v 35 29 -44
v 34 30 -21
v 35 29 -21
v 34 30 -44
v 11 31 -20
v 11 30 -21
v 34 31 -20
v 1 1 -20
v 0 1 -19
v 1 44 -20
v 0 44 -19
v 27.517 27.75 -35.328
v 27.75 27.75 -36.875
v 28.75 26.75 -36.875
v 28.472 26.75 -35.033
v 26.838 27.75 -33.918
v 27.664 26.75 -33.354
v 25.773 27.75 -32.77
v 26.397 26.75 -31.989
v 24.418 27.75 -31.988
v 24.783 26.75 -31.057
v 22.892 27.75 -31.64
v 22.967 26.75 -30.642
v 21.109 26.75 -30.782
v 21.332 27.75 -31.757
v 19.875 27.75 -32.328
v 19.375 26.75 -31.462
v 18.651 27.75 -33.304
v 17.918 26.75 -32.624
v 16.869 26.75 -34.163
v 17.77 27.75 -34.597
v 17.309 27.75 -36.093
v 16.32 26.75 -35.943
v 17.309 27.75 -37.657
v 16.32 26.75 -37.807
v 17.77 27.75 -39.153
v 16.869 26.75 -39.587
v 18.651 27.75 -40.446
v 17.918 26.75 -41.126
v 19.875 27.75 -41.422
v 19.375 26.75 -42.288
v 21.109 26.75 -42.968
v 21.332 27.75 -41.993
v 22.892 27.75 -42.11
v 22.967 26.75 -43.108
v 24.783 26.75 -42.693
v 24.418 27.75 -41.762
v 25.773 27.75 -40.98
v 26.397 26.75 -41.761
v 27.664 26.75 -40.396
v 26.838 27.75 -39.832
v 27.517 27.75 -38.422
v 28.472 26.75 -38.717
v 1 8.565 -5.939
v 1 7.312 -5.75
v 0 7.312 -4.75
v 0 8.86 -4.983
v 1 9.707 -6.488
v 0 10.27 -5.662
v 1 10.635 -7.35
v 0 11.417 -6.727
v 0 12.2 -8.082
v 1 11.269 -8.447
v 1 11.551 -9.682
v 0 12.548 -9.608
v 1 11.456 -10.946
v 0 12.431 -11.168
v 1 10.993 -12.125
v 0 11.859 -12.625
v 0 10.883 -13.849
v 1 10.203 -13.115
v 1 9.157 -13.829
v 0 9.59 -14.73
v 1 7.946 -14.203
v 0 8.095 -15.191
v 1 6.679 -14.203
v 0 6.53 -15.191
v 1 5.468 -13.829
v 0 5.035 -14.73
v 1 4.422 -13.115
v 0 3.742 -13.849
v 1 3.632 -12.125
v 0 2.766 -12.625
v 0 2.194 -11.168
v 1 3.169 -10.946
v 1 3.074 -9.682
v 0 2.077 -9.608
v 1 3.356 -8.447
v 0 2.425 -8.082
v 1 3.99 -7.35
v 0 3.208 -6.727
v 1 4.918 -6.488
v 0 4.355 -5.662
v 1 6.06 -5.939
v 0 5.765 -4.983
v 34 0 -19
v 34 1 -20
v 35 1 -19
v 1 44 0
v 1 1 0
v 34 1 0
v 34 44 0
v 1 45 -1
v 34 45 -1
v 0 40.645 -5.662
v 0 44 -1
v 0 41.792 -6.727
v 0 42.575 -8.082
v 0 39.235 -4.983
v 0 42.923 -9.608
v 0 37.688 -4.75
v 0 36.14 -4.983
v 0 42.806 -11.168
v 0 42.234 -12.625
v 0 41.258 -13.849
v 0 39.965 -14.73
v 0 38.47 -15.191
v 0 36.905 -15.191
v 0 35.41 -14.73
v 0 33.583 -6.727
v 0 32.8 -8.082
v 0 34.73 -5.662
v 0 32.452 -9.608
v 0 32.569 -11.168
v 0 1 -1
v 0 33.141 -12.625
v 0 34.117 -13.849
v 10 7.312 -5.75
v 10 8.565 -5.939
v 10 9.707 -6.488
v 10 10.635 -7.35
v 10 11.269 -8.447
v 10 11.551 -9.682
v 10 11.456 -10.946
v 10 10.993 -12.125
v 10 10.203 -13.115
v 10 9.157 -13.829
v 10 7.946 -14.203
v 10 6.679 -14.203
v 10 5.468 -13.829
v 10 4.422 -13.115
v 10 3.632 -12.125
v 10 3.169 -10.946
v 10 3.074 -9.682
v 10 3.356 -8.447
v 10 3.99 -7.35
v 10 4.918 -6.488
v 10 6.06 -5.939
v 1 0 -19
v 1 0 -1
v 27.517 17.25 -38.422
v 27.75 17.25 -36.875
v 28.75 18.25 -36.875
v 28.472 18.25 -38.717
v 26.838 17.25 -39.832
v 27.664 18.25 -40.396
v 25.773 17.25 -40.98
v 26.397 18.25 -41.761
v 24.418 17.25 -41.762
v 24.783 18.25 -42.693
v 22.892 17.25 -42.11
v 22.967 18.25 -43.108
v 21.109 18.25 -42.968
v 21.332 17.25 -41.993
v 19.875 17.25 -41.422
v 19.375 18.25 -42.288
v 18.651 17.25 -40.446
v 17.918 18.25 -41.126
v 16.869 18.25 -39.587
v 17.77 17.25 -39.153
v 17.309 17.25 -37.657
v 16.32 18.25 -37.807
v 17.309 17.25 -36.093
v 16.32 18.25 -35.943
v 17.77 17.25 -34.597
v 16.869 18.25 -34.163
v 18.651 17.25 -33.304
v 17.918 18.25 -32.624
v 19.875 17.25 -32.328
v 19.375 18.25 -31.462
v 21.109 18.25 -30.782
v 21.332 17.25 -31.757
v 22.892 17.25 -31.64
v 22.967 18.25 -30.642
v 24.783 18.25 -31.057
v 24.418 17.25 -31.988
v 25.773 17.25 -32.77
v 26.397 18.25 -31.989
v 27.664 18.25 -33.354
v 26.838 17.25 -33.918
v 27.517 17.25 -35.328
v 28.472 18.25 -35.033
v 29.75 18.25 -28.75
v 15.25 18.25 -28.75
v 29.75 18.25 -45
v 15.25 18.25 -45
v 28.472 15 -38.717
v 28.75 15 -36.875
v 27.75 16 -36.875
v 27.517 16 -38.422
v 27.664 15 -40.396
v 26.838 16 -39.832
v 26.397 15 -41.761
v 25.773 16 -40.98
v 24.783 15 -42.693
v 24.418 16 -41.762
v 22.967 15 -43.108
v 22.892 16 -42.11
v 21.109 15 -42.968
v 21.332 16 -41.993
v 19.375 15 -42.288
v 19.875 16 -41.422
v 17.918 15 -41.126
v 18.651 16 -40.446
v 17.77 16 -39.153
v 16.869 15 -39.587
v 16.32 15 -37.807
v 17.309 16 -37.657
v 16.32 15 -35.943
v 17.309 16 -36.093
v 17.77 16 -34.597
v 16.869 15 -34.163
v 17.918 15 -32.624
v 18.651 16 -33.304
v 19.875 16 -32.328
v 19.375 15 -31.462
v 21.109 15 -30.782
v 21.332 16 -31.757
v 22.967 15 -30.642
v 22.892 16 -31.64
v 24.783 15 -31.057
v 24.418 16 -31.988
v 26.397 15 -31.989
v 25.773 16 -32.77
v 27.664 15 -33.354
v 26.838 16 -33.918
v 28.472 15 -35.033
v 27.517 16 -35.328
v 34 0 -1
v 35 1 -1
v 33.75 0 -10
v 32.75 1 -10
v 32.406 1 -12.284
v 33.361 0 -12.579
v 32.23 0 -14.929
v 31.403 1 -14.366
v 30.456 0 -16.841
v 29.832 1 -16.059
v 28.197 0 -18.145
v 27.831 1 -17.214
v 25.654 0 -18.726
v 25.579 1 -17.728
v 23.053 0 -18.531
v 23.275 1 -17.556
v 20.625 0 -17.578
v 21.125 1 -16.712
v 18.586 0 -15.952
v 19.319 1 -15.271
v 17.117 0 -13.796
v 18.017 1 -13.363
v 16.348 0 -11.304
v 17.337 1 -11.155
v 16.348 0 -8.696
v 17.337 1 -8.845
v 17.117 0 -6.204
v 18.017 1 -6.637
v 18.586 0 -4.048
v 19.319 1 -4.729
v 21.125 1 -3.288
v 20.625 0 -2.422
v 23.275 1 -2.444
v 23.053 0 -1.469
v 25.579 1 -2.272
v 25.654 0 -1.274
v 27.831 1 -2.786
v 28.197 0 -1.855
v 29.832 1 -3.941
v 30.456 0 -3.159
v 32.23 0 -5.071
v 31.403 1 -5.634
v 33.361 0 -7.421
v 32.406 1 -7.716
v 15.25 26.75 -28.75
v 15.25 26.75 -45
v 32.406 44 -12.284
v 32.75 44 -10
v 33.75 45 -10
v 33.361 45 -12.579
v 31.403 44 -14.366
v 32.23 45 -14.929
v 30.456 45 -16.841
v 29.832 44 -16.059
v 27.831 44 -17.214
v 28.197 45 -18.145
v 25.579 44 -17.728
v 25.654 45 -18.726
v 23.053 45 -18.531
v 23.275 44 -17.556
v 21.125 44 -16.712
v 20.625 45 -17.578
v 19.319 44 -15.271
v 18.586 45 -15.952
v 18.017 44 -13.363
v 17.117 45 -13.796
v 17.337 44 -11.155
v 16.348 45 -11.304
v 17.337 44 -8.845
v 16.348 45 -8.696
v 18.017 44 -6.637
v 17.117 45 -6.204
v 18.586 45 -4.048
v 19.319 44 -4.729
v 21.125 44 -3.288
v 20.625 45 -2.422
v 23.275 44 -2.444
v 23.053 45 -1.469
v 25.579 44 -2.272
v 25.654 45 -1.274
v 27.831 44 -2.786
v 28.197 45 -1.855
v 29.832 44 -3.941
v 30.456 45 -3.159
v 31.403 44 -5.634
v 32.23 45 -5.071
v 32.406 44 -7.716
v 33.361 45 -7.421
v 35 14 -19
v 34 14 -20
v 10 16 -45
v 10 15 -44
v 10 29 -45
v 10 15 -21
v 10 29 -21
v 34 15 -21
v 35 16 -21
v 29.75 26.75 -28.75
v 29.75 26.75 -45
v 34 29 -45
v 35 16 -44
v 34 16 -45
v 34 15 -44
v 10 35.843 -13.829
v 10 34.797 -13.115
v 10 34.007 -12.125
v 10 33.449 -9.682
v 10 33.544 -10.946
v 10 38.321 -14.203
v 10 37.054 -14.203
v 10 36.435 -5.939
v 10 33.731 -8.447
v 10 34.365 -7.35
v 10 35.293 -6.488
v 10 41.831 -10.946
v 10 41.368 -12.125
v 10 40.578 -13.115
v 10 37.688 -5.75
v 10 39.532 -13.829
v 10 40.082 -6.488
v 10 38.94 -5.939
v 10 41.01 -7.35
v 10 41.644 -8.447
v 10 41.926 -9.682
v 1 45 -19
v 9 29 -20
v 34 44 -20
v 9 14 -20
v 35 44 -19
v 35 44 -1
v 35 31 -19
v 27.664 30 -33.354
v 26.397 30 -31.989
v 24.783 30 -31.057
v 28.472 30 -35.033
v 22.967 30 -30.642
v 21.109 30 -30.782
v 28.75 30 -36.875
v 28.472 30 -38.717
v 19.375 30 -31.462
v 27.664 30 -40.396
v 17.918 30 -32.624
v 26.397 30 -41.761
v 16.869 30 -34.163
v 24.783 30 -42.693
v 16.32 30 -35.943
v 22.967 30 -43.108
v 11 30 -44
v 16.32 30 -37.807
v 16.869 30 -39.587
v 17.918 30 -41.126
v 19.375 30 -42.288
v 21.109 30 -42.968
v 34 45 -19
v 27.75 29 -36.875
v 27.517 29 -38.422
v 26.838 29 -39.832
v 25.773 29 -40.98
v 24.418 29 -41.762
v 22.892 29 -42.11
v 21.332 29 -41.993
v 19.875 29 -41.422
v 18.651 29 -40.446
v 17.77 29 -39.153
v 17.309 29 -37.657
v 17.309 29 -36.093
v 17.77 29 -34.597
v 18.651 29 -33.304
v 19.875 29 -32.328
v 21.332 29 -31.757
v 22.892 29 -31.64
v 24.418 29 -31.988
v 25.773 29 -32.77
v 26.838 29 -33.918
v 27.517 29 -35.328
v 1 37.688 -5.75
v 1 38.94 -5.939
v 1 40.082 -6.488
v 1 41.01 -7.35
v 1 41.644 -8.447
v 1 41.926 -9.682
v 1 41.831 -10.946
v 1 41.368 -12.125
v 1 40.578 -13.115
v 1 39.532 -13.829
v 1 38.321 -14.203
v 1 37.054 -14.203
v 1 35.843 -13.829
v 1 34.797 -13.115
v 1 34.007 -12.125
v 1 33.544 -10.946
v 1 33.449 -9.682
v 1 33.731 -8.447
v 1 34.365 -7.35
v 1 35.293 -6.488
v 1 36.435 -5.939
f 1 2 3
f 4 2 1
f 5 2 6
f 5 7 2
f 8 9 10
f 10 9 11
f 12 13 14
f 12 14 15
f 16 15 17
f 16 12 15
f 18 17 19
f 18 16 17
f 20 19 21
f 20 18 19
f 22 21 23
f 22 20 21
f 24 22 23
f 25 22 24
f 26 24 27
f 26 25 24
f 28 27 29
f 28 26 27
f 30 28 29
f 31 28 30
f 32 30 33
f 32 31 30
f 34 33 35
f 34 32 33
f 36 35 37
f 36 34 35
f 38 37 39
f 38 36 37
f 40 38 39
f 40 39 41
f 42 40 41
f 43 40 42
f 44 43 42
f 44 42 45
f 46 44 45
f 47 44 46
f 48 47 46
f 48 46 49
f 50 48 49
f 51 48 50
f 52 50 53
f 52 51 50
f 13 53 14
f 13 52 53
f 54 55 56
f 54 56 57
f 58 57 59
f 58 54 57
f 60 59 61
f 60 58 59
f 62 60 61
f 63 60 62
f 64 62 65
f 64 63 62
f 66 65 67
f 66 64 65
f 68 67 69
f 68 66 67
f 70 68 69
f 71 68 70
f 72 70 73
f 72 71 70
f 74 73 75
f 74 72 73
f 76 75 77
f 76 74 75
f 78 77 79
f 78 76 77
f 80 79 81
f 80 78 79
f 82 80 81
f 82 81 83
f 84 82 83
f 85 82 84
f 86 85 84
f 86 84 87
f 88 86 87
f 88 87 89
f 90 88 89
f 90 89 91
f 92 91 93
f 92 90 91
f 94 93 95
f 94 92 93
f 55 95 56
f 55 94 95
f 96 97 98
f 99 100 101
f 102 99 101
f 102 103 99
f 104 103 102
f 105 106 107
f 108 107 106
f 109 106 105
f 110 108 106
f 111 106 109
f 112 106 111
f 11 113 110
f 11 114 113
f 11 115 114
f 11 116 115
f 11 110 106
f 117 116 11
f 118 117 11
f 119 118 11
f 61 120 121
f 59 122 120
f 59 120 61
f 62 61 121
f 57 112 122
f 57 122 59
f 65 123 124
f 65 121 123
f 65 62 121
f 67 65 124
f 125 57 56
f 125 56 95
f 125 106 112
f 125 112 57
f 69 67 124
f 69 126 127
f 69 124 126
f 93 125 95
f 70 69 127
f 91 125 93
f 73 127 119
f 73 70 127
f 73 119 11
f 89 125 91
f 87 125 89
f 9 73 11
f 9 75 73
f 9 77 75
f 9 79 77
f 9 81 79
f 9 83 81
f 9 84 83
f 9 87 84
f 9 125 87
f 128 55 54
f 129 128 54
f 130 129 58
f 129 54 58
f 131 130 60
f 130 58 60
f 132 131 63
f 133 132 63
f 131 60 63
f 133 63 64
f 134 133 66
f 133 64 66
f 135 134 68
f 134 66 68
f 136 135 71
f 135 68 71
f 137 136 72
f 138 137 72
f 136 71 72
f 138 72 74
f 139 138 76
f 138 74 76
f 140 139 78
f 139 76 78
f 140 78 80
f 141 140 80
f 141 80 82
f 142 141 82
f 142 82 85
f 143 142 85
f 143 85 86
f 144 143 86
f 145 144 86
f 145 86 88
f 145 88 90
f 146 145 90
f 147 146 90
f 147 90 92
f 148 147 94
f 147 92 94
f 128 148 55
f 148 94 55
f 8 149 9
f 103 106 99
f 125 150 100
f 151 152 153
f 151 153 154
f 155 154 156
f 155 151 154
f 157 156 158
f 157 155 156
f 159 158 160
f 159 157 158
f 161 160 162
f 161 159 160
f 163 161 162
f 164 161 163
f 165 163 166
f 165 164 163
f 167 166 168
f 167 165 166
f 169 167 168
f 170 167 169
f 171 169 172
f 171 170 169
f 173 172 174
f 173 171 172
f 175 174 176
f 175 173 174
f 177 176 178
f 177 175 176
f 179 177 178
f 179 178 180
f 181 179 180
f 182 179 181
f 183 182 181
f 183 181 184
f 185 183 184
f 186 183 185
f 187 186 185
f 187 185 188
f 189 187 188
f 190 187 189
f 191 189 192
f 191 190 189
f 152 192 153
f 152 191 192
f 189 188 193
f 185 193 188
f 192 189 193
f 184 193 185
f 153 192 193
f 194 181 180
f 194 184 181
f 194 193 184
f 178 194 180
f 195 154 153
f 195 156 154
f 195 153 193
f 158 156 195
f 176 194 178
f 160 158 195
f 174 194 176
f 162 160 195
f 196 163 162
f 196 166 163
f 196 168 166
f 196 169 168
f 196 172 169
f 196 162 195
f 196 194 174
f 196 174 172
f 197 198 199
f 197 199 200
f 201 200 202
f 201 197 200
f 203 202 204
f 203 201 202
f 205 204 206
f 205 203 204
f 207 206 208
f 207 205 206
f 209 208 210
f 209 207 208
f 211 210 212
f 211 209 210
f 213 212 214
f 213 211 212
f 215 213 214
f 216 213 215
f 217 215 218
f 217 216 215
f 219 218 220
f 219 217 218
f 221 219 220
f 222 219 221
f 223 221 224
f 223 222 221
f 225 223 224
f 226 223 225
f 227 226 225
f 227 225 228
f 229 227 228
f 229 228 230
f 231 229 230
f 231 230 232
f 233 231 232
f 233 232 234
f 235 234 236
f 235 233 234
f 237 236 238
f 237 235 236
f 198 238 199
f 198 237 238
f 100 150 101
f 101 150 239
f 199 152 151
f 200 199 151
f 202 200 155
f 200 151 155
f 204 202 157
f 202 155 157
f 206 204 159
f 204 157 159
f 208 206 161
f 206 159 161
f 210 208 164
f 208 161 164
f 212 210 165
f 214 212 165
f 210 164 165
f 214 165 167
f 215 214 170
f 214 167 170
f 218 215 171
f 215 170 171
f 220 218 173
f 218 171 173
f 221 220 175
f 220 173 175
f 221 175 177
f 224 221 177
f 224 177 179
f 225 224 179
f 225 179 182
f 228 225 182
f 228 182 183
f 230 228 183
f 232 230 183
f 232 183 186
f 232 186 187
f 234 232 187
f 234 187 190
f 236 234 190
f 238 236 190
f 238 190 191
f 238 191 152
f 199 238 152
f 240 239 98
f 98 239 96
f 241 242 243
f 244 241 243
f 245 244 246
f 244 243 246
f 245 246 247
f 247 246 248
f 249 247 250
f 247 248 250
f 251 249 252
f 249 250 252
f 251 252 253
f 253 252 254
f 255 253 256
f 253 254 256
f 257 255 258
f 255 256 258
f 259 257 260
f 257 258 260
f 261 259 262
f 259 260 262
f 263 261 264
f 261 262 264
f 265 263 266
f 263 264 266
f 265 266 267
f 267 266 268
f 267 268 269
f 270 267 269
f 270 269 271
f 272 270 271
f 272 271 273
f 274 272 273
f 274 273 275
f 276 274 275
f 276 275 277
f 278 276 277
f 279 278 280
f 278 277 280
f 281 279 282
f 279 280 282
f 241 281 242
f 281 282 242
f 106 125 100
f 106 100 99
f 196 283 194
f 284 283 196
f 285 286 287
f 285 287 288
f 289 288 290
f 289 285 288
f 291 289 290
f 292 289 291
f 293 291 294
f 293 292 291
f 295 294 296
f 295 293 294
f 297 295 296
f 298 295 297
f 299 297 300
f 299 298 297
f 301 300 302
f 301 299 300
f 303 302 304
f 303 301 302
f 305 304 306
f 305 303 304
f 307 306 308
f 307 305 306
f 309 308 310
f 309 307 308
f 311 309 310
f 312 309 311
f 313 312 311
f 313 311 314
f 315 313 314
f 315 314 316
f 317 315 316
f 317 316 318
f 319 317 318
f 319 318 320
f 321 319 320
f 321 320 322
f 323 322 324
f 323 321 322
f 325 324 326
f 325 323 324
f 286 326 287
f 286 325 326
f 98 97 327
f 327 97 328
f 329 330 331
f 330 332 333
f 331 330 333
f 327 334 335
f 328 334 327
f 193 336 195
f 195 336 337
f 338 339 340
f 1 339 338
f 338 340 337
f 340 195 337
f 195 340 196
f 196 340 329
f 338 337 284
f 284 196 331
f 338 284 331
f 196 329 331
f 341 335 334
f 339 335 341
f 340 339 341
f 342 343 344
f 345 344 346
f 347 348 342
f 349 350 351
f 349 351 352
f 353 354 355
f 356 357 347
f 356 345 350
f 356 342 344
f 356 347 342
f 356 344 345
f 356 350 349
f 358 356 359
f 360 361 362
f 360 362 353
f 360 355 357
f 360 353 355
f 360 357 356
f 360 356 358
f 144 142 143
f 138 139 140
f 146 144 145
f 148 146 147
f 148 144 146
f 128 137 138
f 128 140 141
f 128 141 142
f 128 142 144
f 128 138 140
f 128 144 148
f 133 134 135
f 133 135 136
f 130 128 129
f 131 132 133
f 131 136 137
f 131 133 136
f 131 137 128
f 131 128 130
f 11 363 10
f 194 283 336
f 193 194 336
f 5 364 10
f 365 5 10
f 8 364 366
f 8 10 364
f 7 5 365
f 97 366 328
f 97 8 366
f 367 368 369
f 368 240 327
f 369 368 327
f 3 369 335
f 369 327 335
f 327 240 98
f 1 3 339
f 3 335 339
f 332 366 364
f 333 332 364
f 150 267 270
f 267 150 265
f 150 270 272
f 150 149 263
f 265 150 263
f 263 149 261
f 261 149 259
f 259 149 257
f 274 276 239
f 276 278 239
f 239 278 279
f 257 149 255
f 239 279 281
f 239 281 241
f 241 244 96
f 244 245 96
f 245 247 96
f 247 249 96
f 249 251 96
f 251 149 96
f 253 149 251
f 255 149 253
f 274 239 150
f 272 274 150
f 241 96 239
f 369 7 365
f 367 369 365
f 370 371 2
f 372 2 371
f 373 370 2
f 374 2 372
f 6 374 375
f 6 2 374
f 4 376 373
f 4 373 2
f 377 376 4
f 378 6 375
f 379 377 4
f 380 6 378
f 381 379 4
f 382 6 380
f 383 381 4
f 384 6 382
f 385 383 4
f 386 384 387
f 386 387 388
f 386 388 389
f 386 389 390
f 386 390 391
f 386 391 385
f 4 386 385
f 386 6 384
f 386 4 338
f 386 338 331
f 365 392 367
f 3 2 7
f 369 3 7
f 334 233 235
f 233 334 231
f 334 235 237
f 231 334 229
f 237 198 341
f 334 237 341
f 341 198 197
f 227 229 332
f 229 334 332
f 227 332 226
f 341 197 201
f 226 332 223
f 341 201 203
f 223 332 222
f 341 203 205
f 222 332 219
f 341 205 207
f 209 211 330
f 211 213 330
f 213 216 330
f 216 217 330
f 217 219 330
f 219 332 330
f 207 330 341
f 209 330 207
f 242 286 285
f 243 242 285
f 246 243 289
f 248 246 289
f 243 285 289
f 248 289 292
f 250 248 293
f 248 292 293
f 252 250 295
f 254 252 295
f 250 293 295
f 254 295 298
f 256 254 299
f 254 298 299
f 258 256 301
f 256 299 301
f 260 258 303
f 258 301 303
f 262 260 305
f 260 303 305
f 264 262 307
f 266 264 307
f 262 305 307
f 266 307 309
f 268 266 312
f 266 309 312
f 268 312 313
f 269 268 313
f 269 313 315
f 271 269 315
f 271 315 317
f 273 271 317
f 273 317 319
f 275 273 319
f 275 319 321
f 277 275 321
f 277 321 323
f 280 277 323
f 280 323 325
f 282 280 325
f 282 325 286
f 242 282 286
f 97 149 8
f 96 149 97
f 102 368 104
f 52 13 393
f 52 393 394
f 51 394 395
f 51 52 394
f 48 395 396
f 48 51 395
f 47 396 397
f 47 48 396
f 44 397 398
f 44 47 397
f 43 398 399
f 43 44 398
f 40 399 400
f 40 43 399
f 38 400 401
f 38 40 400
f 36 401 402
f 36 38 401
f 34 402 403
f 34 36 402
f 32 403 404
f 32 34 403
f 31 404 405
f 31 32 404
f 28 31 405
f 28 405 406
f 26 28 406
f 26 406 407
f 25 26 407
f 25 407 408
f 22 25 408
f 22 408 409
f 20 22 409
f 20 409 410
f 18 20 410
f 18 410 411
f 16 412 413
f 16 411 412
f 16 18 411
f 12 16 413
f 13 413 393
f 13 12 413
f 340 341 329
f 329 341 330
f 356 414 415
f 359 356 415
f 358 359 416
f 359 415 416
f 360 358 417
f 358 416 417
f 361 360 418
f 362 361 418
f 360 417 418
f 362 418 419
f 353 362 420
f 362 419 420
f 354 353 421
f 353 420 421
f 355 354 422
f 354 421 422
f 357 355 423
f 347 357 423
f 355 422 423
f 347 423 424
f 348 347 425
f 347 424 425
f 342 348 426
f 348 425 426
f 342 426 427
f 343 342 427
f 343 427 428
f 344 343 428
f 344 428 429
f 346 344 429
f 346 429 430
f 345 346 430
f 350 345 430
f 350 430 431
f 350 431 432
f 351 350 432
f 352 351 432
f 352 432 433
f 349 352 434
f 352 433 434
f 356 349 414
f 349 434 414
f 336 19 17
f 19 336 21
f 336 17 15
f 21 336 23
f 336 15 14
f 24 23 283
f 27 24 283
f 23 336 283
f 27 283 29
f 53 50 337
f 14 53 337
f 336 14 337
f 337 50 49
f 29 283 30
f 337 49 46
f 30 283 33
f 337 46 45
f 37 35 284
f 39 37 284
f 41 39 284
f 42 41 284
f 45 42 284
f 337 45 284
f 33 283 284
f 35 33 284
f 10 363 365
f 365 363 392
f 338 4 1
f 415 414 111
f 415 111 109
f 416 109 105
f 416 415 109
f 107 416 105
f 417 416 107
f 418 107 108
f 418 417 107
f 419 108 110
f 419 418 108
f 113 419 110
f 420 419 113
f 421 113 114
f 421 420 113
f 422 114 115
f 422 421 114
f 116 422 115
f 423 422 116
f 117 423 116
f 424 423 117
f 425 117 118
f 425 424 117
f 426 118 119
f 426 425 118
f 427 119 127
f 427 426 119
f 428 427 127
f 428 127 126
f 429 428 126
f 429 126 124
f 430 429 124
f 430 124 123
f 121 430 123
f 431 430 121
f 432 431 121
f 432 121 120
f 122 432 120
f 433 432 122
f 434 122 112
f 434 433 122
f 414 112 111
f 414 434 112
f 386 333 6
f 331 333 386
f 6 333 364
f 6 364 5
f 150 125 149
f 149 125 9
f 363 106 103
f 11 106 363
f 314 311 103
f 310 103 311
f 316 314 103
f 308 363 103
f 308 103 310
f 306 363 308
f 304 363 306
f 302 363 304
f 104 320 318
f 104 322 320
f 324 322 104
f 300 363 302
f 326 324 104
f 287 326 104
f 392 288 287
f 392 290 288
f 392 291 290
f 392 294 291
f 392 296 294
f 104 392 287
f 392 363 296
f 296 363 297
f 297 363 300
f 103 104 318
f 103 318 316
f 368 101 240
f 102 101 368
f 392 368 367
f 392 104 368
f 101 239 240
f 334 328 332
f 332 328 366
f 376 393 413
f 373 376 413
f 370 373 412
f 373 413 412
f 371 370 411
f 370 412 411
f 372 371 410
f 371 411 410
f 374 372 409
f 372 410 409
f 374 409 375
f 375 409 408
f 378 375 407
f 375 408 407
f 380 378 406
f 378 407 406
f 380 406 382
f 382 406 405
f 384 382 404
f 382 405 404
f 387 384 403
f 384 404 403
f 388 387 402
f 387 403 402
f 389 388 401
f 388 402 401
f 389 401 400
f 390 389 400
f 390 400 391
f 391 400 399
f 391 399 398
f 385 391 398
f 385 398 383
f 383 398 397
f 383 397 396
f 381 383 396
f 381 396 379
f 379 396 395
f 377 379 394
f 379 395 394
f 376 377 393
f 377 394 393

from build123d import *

# Parameters (mm, degrees)
SKETCH1_W               = 35
SKETCH1_H               = 20
BOSS_EXTRUDE1_DEPTH     = 45
SKETCH2_R               = 7.75
CUT_EXTRUDE1_DEPTH      = 46
SKETCH10_R              = 4.25
CUT_EXTRUDE6_DEPTH      = 10
SKETCH4_W               = 25
SKETCH4_H               = 15
BOSS_EXTRUDE2_DEPTH     = 25
SKETCH5_W               = 14.5
SKETCH5_H               = 16.25
CUT_EXTRUDE3_DEPTH      = 31
BOSS_EXTRUDE3_REACH     = 21.75
SKETCH6_W               = 16.25
SKETCH6_H               = 3.25
SKETCH7_R               = 5.25
CUT_EXTRUDE4_DEPTH      = 27.75
CUT_EXTRUDE4_DEPTH_BACK = 19.25
CHAMFER1_SIZE           = 1


with BuildPart() as part:
    # Sketch1 → Boss-Extrude1 (new body)
    with BuildSketch(Plane(origin=(0, 0, 0), x_dir=(1, 0, 0), z_dir=(0, 1, 0))):
        with Locations((17.5, 10)):
            Rectangle(SKETCH1_W, SKETCH1_H)
    extrude(amount=BOSS_EXTRUDE1_DEPTH)

    # Sketch2 → Cut-Extrude1 (cut, through all)
    with BuildSketch(Plane(origin=(0, 45, 0), x_dir=(1, 0, 0), z_dir=(0, 1, 0))):
        with Locations((25, 10)):
            Circle(SKETCH2_R)
    extrude(amount=-CUT_EXTRUDE1_DEPTH, mode=Mode.SUBTRACT)

    # Sketch10 → Cut-Extrude6 (cut)
    with BuildSketch(Plane.ZY):
        with Locations((-10, 37.6875)):
            Circle(SKETCH10_R)
        with Locations((-10, 7.3125)):
            Circle(SKETCH10_R)
    extrude(amount=-CUT_EXTRUDE6_DEPTH, mode=Mode.SUBTRACT)

    # Sketch4 → Boss-Extrude2 (add)
    with BuildSketch(Plane(origin=(0, 0, -20), x_dir=(-1, 0, 0), z_dir=(0, 0, -1))):
        with Locations((-22.5, 22.5)):
            Rectangle(SKETCH4_W, SKETCH4_H)
    extrude(amount=BOSS_EXTRUDE2_DEPTH)

    # Sketch5 → Cut-Extrude3 (cut, through all)
    with BuildSketch(Plane(origin=(0, 30, 0), x_dir=(1, 0, 0), z_dir=(0, 1, 0))):
        with Locations((22.5, 36.875)):
            Rectangle(SKETCH5_W, SKETCH5_H)
    extrude(amount=-CUT_EXTRUDE3_DEPTH, mode=Mode.SUBTRACT)

    # Sketch6 → Boss-Extrude3 (add, up to next)
    with BuildSketch(Plane(origin=(15.25, 0, 0), x_dir=(0, 0, -1), z_dir=(1, 0, 0)), mode=Mode.PRIVATE) as boss_extrude3_sk1:
        with Locations((36.875, 28.375)):
            Rectangle(SKETCH6_W, SKETCH6_H)
    boss_extrude3_tool1 = extrude(boss_extrude3_sk1.sketch, amount=BOSS_EXTRUDE3_REACH, mode=Mode.PRIVATE) - part.part
    add(boss_extrude3_tool1.solids().sort_by_distance((15.25, 28.375, -36.875))[0])
    # Sketch6 → Boss-Extrude3 (add, up to next)
    with BuildSketch(Plane(origin=(15.25, 0, 0), x_dir=(0, 0, -1), z_dir=(1, 0, 0)), mode=Mode.PRIVATE) as boss_extrude3_sk2:
        with Locations((36.875, 16.625)):
            Rectangle(SKETCH6_W, SKETCH6_H)
    boss_extrude3_tool2 = extrude(boss_extrude3_sk2.sketch, amount=BOSS_EXTRUDE3_REACH, mode=Mode.PRIVATE) - part.part
    add(boss_extrude3_tool2.solids().sort_by_distance((15.25, 16.625, -36.875))[0])

    # Sketch7 → Cut-Extrude4 (cut, two sides)
    with BuildSketch(Plane(origin=(0, 18.25, 0), x_dir=(1, 0, 0), z_dir=(0, 1, 0))) as cut_extrude4_sk:
        with Locations((22.5, 36.875)):
            Circle(SKETCH7_R)
    extrude(amount=CUT_EXTRUDE4_DEPTH, mode=Mode.SUBTRACT)
    extrude(cut_extrude4_sk.sketch, amount=-CUT_EXTRUDE4_DEPTH_BACK, mode=Mode.SUBTRACT)

    # Chamfer1
    chamfer1_edges = [part.edges().sort_by_distance(p)[0] for p in [
        (35, 45, -10),
        (17.25, 0, -10),
        (17.25, 45, -10),
        (17.5, 45, -20),
        (0, 37.6875, -14.25),
        (0, 7.3125, -14.25),
        (35, 7.5, -20),
        (10, 22.5, -20),
        (22.5, 30, -20),
        (10, 30, -32.5),
        (35, 30, -32.5),
        (22.5, 15, -20),
        (35, 15, -32.5),
        (22.5, 30, -45),
        (35, 22.5, -45),
        (22.5, 15, -45),
        (0, 45, -10),
        (17.5, 0, -20),
        (35, 0, -10),
        (17.5, 0, 0),
        (0, 0, -10),
        (0, 22.5, -20),
        (35, 37.5, -20),
        (35, 22.5, 0),
        (0, 22.5, 0),
        (17.25, 26.75, -36.875),
        (17.25, 30, -36.875),
        (17.25, 18.25, -36.875),
        (17.25, 15, -36.875),
        (17.5, 45, 0),
    ]]
    chamfer(chamfer1_edges, length=CHAMFER1_SIZE)


solid = part.part
